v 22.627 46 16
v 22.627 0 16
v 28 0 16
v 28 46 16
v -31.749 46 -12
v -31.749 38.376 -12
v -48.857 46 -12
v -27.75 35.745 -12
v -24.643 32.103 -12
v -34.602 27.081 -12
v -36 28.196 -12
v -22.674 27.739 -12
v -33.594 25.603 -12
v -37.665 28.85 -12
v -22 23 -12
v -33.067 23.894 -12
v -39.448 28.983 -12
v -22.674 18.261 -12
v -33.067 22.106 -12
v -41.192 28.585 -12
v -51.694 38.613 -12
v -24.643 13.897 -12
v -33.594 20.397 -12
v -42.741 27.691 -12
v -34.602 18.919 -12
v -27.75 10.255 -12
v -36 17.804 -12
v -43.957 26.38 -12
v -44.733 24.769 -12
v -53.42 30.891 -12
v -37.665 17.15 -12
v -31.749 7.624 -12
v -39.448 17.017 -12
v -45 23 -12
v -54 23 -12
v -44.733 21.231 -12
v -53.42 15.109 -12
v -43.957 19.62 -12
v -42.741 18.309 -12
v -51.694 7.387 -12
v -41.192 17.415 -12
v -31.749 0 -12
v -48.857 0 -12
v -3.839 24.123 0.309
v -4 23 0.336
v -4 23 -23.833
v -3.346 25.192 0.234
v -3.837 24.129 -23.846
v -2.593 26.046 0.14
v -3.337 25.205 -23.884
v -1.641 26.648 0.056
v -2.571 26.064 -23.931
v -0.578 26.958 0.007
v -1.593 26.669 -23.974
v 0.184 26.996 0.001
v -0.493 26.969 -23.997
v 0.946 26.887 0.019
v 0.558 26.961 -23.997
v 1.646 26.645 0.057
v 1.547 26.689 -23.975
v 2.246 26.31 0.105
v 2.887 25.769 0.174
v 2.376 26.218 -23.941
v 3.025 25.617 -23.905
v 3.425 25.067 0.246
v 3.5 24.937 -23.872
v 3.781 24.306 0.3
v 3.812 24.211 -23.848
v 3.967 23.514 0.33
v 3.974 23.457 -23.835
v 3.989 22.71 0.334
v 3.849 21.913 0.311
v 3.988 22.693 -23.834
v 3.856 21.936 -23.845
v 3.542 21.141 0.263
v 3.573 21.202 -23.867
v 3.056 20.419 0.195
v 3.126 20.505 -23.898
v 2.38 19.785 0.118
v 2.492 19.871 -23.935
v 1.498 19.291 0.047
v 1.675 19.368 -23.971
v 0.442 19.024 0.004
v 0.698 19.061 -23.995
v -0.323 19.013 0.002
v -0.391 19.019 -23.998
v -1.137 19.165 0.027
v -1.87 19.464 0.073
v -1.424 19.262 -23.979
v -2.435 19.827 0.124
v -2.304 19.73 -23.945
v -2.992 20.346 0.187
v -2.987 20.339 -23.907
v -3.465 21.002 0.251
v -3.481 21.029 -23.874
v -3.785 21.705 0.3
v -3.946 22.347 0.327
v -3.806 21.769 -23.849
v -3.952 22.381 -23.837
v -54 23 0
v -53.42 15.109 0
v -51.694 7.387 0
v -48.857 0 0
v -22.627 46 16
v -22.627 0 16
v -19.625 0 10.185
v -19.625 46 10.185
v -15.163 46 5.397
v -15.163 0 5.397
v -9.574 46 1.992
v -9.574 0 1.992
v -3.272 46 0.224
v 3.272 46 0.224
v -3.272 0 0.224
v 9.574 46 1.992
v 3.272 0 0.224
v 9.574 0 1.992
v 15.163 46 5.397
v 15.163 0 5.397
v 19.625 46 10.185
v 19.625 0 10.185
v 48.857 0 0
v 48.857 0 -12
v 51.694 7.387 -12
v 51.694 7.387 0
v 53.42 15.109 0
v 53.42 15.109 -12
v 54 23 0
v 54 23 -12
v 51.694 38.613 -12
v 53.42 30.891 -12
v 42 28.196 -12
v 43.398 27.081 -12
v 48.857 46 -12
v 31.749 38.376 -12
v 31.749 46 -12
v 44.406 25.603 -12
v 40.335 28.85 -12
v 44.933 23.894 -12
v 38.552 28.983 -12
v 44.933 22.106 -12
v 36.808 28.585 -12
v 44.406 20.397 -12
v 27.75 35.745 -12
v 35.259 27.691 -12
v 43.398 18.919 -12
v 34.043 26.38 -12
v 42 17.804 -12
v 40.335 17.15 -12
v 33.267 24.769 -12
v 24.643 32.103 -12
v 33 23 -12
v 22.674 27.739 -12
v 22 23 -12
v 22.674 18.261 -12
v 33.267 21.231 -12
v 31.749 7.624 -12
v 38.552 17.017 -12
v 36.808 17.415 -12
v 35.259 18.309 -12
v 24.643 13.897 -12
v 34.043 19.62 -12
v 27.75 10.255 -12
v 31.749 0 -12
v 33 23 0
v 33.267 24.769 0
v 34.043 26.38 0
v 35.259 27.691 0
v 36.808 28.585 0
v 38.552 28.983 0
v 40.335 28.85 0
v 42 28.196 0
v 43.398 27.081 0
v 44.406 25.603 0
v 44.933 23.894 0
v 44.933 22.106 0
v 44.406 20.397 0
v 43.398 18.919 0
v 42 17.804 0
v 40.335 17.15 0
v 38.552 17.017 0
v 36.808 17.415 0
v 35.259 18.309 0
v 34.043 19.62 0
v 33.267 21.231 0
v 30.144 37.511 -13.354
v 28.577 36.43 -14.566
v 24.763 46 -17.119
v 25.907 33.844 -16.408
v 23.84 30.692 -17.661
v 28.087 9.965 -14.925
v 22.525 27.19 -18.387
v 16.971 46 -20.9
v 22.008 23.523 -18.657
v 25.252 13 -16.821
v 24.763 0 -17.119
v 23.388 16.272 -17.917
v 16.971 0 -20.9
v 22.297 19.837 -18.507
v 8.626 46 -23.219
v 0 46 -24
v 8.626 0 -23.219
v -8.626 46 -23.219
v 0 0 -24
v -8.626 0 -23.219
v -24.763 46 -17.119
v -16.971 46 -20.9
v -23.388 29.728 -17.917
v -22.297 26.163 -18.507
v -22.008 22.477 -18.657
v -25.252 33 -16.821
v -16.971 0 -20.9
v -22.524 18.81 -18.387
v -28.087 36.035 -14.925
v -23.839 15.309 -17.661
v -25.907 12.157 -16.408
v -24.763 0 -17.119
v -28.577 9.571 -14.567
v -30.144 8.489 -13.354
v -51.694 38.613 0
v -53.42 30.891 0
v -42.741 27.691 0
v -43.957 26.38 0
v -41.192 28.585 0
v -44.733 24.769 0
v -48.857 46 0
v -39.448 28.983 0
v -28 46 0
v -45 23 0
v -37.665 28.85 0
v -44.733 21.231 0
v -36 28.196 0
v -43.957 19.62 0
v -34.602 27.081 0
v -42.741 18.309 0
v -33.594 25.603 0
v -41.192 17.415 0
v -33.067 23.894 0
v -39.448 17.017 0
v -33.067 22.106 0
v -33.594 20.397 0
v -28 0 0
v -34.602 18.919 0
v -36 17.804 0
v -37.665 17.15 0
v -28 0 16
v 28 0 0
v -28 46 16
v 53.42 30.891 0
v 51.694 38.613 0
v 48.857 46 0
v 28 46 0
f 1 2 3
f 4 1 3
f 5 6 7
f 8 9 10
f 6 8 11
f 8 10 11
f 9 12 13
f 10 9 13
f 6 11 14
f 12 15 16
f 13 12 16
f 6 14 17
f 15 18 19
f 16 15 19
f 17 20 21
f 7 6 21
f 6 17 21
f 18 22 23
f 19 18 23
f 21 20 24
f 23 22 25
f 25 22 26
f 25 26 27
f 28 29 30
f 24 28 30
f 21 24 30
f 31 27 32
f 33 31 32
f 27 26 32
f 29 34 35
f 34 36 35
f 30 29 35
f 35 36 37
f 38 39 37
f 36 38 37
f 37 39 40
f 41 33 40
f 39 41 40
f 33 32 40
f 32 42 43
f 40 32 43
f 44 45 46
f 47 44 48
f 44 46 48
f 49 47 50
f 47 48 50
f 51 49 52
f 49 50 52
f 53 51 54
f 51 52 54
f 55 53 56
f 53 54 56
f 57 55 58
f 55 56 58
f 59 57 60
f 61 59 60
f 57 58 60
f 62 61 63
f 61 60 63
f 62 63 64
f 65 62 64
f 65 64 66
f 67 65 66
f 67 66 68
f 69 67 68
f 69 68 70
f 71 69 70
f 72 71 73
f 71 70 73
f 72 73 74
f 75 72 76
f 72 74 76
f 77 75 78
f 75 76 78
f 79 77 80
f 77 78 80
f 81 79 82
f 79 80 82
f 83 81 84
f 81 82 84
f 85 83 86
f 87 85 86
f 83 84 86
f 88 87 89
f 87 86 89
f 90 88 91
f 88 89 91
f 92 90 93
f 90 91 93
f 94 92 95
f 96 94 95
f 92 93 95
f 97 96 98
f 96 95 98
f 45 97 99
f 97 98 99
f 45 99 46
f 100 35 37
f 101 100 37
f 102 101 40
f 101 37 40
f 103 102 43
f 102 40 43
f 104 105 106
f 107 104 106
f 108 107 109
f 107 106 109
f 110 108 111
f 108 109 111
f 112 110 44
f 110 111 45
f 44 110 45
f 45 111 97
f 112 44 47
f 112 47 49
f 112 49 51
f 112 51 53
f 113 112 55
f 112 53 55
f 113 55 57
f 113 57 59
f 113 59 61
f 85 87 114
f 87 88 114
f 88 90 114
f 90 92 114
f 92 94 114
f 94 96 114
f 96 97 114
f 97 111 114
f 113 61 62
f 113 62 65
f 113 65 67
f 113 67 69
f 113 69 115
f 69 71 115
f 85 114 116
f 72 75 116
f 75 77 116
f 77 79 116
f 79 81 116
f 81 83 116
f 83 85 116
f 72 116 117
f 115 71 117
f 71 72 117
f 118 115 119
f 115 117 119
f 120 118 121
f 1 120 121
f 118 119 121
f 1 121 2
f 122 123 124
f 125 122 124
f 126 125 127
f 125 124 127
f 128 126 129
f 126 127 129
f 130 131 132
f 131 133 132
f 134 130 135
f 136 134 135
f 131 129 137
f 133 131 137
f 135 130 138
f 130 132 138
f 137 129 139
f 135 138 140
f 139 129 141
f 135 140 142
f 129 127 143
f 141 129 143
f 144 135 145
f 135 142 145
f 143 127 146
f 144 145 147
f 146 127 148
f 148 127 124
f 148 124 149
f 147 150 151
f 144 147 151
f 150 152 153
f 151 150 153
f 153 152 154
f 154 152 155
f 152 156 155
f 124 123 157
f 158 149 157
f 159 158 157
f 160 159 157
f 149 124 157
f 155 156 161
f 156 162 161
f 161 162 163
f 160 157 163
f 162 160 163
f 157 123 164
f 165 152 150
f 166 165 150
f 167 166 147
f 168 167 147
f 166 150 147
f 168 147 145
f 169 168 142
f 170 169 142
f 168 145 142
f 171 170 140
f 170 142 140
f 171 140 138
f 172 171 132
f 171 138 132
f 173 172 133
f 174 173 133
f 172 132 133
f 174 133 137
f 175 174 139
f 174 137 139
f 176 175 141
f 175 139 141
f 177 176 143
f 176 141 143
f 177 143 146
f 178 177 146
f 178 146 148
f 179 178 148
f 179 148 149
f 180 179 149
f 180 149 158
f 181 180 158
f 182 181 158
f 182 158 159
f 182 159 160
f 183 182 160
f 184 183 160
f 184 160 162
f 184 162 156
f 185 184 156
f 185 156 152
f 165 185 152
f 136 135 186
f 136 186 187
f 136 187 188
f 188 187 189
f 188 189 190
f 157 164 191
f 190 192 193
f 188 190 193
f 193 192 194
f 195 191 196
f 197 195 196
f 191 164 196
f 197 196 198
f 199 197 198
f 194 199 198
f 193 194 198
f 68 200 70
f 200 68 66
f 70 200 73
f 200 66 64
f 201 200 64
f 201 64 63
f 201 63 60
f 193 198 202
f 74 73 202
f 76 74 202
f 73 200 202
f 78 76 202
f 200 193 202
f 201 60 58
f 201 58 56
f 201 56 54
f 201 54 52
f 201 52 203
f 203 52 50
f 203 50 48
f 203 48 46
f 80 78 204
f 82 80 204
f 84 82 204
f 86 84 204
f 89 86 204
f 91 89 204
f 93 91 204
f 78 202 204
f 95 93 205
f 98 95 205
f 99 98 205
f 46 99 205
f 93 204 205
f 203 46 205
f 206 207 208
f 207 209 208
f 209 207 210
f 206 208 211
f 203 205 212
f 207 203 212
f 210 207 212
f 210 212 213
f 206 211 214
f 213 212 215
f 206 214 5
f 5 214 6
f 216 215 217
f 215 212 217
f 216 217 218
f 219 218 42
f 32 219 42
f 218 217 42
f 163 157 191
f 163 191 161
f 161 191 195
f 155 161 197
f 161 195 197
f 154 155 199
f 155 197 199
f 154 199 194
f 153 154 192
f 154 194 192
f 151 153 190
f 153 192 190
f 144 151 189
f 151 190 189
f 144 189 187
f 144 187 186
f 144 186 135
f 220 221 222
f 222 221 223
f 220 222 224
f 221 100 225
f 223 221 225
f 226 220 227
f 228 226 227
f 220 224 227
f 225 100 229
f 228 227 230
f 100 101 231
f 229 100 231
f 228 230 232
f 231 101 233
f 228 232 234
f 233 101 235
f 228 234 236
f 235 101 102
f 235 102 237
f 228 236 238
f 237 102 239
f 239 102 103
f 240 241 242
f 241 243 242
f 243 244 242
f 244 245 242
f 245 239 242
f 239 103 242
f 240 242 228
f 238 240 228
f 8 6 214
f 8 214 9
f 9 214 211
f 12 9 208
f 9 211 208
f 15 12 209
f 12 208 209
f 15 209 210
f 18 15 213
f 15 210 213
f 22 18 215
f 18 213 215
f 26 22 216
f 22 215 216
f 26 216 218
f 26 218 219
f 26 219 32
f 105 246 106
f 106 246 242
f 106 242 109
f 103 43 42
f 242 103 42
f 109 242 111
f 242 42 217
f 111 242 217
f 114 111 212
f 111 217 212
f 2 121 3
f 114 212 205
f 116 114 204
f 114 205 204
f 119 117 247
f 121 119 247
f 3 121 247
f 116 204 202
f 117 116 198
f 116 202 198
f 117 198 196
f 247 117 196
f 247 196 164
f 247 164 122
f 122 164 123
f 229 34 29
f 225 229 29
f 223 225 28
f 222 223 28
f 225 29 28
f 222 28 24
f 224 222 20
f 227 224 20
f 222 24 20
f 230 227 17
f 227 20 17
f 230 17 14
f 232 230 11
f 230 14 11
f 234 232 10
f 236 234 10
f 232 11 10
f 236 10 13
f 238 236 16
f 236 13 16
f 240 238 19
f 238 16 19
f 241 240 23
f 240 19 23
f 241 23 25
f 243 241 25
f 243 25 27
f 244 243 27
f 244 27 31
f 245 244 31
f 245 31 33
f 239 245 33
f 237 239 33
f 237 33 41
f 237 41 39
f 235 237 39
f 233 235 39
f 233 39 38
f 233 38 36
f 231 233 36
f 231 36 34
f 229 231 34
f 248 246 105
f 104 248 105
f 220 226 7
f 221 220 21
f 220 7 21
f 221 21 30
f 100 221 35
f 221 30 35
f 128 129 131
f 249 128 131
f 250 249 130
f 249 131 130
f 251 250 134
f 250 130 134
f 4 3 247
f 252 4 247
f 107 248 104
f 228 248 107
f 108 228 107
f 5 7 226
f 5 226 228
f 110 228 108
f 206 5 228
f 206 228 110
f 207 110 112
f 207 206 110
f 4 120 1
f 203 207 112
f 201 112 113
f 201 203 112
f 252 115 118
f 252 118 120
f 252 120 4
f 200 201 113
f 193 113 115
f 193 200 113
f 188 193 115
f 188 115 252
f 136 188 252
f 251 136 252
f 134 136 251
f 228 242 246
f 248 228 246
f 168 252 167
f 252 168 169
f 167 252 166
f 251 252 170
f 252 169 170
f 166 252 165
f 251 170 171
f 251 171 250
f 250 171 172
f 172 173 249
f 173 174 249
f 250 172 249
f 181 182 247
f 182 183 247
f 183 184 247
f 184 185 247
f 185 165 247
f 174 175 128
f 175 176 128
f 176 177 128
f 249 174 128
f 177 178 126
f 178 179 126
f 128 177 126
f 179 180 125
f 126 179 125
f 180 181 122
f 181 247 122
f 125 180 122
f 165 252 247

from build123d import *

# Parameters (mm, degrees)
BOSS_EXTRUDE1_DEPTH = 46
SKETCH2_R           = 6
CUT_EXTRUDE1_DEPTH  = 77.26270386
SKETCH3_R           = 4
CUT_EXTRUDE2_DEPTH  = 24
CUT_EXTRUDE4_START  = 48
SKETCH2_5_R         = 6
CUT_EXTRUDE4_DEPTH  = 48


with BuildPart() as part:
    # Sketch1 → Boss-Extrude1 (new body)
    with BuildSketch(Plane(origin=(0, 0, 0), x_dir=(1, 0, 0), z_dir=(0, 1, 0))):
        with BuildLine():
            Line((-54, 0), (-28, 0))
            Line((-28, 0), (-28, -16))
            Line((-28, -16), (-22.627416998, -16))
            ThreePointArc((-22.627416998, -16), (0, 0), (22.627416998, -16))
            Line((22.627416998, -16), (28, -16))
            Line((28, -16), (28, 0))
            Line((28, 0), (54, 0))
            Line((54, 0), (54, 12))
            Line((54, 12), (31.749015733, 12))
            ThreePointArc((31.749015733, 12), (0, 24), (-31.749015733, 12))
            Line((-31.749015733, 12), (-54, 12))
            Line((-54, 12), (-54, 0))
        make_face()
    extrude(amount=BOSS_EXTRUDE1_DEPTH)

    # Sketch2 → Cut-Extrude1 (cut, through all)
    with BuildSketch(Plane(origin=(0, 0, -12), x_dir=(-1, 0, 0), z_dir=(0, 0, -1))):
        with BuildLine():
            Line((-48.856934001, 46), (-54, 46))
            Line((-54, 46), (-54, 23))
            ThreePointArc((-54, 23), (-52.698550436, 34.784005345), (-48.856934001, 46))
        make_face()
        with BuildLine():
            ThreePointArc((-48.856934001, 0), (-52.698550436, 11.215994655), (-54, 23))
            Line((-54, 23), (-54, 0))
            Line((-54, 0), (-48.856934001, 0))
        make_face()
        with BuildLine():
            Line((54, 23), (54, 46))
            Line((54, 46), (48.856934001, 46))
            ThreePointArc((48.856934001, 46), (52.698550436, 34.784005345), (54, 23))
        make_face()
        with BuildLine():
            Line((54, 0), (54, 23))
            ThreePointArc((54, 23), (52.698550436, 11.215994655), (48.856934001, 0))
            Line((48.856934001, 0), (54, 0))
        make_face()
        with Locations((-39, 23)):
            Circle(SKETCH2_R)
        with Locations((39, 23)):
            Circle(SKETCH2_R)
    extrude(amount=-CUT_EXTRUDE1_DEPTH, mode=Mode.SUBTRACT)

    # Sketch3 → Cut-Extrude2 (cut, symmetric)
    with BuildSketch(Plane(origin=(0, 0, -12), x_dir=(-1, 0, 0), z_dir=(0, 0, -1))):
        with Locations((0, 23)):
            Circle(SKETCH3_R)
    extrude(amount=CUT_EXTRUDE2_DEPTH, both=True, mode=Mode.SUBTRACT)

    # Sketch2<5> → Cut-Extrude4 (cut)
    # profile 1 of 2: a face of its own
    with BuildSketch(Plane(origin=(0, 0, -12), x_dir=(-1, 0, 0), z_dir=(0, 0, -1)).offset(CUT_EXTRUDE4_START)):
        with BuildLine():
            Line((-39, 46), (-48.856934001, 46))
            ThreePointArc((-48.856934001, 46), (-54, 23), (-48.856934001, 0))
            Line((-48.856934001, 0), (-39, 0))
            Line((-39, 0), (-39, 6))
            ThreePointArc((-39, 6), (-22, 23), (-39, 40))
            Line((-39, 40), (-39, 46))
        make_face()
        with Locations((-39, 23)):
            Circle(SKETCH2_5_R, mode=Mode.SUBTRACT)
    # profile 2 of 2: a face of its own
    with BuildSketch(Plane(origin=(0, 0, -12), x_dir=(-1, 0, 0), z_dir=(0, 0, -1)).offset(CUT_EXTRUDE4_START)):
        with BuildLine():
            ThreePointArc((48.856934001, 0), (54, 23), (48.856934001, 46))
            Line((48.856934001, 46), (39, 46))
            Line((39, 46), (39, 40))
            ThreePointArc((39, 40), (22, 23), (39, 6))
            Line((39, 6), (39, 0))
            Line((39, 0), (48.856934001, 0))
        make_face()
        with Locations((39, 23)):
            Circle(SKETCH2_5_R, mode=Mode.SUBTRACT)
    extrude(amount=-CUT_EXTRUDE4_DEPTH, mode=Mode.SUBTRACT)


solid = part.part
